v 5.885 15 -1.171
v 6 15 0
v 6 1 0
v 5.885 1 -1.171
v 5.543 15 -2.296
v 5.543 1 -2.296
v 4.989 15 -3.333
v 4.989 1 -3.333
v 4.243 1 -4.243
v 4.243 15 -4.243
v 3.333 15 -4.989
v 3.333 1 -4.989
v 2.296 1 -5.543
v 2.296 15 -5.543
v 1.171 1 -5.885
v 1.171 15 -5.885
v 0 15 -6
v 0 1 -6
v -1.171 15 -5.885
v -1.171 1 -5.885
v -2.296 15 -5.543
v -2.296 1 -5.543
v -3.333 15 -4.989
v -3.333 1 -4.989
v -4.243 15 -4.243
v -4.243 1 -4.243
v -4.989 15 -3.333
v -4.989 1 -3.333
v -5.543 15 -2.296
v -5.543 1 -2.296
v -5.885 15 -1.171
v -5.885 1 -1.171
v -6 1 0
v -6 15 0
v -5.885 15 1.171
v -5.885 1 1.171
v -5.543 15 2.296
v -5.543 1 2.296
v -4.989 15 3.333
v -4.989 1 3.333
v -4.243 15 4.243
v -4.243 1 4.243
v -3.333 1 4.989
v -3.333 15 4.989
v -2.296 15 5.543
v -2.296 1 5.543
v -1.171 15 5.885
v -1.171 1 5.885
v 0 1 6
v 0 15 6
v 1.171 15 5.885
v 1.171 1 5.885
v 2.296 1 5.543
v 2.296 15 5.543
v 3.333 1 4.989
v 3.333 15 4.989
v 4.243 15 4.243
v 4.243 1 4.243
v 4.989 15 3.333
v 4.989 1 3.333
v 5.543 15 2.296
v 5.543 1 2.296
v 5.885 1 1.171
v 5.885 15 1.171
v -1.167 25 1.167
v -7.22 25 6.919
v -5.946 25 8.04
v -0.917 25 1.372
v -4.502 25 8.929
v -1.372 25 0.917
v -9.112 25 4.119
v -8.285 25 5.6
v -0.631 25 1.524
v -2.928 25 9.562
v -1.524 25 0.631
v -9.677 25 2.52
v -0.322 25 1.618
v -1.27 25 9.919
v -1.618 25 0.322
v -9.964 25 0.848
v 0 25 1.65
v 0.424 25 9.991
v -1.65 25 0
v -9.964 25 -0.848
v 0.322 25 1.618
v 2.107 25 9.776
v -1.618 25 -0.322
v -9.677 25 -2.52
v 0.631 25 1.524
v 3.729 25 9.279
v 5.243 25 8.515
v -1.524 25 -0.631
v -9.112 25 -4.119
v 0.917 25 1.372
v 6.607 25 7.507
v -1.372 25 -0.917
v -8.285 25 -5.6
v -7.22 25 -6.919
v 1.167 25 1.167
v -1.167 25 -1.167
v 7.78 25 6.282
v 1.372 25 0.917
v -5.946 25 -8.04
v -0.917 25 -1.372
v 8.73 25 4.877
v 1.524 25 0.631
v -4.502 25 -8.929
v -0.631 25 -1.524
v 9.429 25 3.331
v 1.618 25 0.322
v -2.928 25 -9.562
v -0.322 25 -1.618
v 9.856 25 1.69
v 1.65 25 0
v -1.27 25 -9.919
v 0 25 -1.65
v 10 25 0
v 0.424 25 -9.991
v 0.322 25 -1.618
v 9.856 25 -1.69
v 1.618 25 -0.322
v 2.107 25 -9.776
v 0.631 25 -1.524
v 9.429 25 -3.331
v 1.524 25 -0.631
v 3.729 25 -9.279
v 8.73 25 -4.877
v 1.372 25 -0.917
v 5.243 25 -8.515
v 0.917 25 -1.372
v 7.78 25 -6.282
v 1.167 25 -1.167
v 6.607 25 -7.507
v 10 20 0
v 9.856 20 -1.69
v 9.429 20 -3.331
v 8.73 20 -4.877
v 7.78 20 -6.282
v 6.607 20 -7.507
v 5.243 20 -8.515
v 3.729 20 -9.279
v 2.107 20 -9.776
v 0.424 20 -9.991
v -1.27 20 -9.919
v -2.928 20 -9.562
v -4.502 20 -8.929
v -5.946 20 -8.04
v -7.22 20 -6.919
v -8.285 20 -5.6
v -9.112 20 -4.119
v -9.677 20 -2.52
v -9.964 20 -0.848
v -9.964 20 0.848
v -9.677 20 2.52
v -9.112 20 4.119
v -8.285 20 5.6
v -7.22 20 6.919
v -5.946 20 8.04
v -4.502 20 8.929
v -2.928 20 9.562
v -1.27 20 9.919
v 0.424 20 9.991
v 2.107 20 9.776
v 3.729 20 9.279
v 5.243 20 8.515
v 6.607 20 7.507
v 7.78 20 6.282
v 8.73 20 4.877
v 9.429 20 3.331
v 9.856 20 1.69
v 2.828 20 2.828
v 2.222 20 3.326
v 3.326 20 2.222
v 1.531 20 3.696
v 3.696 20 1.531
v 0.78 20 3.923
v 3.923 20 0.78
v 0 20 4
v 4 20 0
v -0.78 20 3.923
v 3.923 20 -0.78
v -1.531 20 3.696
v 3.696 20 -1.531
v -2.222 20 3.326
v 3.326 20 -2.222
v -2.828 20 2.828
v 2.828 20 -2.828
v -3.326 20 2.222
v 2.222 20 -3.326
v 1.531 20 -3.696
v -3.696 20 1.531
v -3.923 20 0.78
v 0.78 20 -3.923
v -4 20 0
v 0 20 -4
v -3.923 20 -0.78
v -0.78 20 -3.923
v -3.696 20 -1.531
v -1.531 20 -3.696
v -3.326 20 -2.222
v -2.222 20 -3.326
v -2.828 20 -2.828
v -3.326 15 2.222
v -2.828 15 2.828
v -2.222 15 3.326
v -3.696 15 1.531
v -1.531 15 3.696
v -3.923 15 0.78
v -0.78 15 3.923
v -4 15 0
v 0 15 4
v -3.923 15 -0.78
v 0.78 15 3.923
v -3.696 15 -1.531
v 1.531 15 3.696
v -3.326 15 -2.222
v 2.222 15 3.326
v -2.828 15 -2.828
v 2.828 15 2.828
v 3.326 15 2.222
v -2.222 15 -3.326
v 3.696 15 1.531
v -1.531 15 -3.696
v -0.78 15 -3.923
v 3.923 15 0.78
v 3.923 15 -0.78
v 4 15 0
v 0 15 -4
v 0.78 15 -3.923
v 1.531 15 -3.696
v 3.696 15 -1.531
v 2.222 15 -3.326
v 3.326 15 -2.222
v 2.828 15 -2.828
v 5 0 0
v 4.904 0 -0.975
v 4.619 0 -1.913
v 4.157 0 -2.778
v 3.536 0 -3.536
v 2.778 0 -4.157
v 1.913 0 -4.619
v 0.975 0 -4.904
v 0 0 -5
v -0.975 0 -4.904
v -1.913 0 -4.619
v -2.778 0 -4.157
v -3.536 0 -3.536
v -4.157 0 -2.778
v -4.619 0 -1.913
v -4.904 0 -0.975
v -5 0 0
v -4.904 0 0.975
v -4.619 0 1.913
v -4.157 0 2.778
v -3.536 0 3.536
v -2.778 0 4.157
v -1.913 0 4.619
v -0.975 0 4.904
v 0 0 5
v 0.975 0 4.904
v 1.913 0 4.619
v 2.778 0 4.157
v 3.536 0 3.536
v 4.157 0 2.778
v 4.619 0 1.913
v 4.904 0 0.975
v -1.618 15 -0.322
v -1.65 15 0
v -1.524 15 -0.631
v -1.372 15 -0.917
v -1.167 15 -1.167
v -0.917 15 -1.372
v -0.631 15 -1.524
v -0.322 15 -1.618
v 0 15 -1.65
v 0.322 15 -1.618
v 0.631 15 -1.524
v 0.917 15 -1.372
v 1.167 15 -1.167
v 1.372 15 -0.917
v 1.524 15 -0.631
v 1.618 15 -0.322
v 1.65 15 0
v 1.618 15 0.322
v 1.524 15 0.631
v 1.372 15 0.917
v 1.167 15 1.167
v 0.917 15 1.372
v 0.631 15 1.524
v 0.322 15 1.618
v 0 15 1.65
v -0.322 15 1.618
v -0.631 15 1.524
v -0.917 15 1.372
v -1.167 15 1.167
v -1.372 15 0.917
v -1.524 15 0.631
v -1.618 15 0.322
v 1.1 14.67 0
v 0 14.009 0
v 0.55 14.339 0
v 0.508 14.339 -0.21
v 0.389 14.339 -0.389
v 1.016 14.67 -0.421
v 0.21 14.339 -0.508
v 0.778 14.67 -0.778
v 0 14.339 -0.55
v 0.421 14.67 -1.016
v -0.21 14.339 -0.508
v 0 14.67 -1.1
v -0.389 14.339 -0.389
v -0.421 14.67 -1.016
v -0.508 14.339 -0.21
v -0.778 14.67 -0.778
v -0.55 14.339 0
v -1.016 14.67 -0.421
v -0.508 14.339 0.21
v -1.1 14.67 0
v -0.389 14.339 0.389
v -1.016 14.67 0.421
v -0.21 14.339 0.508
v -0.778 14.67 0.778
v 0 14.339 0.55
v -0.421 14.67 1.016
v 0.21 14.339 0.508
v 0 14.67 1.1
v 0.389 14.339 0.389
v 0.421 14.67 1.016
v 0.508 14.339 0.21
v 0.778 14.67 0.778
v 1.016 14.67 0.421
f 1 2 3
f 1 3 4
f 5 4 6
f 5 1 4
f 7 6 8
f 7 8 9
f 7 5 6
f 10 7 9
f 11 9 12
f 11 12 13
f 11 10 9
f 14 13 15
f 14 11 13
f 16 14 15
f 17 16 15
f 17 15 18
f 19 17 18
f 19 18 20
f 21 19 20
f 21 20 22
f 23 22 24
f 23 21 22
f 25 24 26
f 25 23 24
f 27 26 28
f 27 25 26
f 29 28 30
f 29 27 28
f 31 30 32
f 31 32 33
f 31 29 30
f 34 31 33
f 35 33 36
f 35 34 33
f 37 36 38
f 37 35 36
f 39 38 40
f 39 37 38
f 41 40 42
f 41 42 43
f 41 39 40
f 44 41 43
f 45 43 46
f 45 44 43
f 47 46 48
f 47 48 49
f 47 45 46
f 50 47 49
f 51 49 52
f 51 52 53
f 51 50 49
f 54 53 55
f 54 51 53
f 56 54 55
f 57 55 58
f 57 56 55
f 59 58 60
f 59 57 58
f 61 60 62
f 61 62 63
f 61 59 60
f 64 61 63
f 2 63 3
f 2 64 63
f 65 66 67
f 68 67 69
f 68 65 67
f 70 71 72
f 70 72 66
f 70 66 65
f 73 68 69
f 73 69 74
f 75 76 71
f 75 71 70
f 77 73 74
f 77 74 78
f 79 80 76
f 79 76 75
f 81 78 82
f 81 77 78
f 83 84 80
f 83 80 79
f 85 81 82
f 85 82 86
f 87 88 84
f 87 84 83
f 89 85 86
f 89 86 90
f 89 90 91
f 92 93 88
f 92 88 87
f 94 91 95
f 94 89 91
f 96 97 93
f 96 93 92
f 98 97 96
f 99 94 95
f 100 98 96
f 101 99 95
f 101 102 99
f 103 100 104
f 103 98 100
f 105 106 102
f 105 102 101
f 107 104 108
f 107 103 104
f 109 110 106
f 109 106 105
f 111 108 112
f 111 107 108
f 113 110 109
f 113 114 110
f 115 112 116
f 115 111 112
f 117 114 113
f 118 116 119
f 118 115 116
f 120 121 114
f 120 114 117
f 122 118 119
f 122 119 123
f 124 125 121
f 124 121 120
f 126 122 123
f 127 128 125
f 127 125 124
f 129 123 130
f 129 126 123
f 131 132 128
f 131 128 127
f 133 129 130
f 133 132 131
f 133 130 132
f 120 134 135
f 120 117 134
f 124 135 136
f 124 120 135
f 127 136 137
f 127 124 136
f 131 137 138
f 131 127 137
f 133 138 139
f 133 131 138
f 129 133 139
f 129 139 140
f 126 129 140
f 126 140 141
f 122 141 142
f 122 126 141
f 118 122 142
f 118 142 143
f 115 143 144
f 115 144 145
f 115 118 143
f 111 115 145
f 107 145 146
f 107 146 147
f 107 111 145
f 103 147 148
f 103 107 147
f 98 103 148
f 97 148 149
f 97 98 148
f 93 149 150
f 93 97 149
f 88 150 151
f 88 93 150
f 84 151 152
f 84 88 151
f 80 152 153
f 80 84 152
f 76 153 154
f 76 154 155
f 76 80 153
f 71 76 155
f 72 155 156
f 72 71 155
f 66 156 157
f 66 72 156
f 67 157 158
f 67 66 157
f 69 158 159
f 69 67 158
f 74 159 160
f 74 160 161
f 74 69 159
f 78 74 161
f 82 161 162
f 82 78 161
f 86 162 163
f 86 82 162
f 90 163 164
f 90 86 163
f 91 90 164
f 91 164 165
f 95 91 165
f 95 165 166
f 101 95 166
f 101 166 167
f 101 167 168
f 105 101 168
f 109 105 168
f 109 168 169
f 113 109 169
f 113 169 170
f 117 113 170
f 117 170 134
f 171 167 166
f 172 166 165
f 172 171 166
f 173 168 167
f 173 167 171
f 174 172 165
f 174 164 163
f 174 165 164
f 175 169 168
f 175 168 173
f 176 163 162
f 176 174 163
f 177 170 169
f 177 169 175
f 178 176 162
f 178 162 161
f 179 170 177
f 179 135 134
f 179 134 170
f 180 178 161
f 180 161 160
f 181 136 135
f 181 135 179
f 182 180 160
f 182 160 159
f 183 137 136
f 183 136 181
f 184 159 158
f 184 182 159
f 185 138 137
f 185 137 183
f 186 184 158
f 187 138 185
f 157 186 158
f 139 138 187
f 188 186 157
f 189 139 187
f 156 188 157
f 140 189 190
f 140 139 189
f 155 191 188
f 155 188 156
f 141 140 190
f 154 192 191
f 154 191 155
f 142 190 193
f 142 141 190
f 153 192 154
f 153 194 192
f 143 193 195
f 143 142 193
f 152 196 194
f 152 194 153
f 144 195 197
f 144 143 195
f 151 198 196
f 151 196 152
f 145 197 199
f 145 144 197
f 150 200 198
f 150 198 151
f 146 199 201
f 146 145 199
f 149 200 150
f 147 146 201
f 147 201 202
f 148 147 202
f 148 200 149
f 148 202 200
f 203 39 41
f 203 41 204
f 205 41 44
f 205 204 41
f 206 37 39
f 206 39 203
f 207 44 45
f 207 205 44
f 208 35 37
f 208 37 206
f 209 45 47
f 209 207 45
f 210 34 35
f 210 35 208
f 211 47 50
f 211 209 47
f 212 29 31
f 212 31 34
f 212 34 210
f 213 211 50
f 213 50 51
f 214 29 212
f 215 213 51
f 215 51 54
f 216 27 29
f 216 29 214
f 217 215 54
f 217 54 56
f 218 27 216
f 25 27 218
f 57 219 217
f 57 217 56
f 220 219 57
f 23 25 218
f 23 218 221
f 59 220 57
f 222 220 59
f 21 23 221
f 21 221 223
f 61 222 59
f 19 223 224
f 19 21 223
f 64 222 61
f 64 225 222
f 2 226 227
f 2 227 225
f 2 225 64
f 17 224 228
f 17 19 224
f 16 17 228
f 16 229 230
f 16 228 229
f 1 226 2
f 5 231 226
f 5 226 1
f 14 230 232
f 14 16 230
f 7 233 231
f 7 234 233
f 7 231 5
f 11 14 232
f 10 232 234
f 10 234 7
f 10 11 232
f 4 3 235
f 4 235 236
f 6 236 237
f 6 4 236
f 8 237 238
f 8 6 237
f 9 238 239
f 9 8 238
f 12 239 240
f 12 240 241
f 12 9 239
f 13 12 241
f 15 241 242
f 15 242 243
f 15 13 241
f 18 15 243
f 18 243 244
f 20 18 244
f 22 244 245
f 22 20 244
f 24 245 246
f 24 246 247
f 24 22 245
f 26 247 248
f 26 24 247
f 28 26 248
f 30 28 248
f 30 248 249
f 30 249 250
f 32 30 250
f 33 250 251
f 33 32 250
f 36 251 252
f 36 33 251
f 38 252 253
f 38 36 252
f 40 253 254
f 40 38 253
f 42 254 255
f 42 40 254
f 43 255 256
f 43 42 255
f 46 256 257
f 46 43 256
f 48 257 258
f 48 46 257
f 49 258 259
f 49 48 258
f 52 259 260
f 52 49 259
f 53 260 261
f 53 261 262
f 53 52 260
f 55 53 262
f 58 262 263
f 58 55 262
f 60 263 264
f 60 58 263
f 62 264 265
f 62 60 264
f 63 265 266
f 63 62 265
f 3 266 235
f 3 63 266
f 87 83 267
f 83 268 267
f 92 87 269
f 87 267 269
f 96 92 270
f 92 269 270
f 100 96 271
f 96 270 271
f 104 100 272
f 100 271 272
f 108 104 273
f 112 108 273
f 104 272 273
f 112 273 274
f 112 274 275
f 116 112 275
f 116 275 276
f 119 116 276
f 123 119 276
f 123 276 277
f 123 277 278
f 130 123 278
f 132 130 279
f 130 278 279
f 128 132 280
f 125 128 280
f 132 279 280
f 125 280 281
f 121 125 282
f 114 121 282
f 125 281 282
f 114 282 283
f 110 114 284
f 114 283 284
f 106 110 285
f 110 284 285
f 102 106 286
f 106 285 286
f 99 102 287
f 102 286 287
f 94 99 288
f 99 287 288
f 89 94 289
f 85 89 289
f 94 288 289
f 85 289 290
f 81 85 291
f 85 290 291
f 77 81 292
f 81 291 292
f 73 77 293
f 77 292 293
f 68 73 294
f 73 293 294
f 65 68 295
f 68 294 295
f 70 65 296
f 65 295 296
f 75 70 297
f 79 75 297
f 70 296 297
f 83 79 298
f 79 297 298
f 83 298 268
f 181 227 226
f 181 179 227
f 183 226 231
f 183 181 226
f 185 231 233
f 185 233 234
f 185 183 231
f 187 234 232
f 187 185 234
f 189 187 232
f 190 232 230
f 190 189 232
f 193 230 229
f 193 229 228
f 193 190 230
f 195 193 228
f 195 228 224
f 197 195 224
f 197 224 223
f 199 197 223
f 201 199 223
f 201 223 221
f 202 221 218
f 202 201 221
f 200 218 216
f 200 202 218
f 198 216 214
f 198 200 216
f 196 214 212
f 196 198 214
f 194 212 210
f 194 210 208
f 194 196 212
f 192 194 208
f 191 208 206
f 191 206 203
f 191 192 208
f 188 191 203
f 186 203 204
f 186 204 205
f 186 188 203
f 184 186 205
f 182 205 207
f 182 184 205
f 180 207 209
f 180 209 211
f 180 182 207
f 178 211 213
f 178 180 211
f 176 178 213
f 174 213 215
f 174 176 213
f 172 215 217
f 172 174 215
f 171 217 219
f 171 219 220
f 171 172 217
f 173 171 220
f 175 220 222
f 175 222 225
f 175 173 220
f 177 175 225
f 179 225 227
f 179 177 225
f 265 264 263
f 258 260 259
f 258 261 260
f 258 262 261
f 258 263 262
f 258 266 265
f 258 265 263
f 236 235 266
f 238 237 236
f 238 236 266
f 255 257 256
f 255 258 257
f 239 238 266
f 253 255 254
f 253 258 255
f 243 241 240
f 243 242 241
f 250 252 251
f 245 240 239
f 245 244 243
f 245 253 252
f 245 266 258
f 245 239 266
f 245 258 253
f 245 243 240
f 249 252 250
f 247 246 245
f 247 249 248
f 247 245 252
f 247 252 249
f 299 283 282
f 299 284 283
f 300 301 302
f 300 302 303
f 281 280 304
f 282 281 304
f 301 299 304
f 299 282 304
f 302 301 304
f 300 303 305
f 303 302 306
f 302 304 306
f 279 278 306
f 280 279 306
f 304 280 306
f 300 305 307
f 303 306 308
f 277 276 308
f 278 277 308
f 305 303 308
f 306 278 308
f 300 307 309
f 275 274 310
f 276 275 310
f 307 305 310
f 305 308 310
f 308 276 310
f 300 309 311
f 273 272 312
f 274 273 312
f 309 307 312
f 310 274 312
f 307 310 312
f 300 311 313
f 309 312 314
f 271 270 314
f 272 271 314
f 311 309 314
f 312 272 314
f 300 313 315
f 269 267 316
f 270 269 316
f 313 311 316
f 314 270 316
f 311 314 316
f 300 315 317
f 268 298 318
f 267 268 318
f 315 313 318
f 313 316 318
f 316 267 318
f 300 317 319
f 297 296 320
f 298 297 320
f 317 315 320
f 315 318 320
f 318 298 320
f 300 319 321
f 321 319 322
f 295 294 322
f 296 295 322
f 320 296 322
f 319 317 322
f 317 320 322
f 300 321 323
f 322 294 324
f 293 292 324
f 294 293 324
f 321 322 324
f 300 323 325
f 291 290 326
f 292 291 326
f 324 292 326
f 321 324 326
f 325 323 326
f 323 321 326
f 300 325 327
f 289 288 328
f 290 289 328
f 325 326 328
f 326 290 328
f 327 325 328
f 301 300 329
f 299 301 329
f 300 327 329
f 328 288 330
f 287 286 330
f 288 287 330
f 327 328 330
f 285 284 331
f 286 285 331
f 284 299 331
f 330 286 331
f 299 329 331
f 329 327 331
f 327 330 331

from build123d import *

# Parameters (mm, degrees)
CHAMFER_1_SIZE         = 1
HOLE_WIZARD_M4_1_D     = 3.3
HOLE_WIZARD_M4_1_DEPTH = 10
HOLE_WIZARD_M4_1_TIP   = 0.991420021


with BuildPart() as part:
    # 草图1 → 旋转1 (revolve)
    with BuildSketch(Plane.XY, mode=Mode.PRIVATE) as revolve_1_sk:
        Polygon((0, 0), (-6, 0), (-6, 15), (-4, 15), (-4, 20), (-10, 20), (-10, 25), (0, 25), align=None)
    revolve(revolve_1_sk.sketch.rotate(Axis((0, -198.13008407, 0), (0, 1, 0)), 180), axis=Axis((0, -198.13008407, 0), (0, 1, 0)))

    # 倒角1
    chamfer_1_edges = [part.edges().sort_by_distance(p)[0] for p in [
        (-6, 0, 0),
    ]]
    chamfer(chamfer_1_edges, length=CHAMFER_1_SIZE)

    # M4 螺纹孔1
    with Locations(Plane(origin=(0, 25, 0), x_dir=(1, 0, 0), z_dir=(0, 1, 0))):
        with Locations((0, 0)):
            Hole(HOLE_WIZARD_M4_1_D / 2, depth=HOLE_WIZARD_M4_1_DEPTH)
            with Locations((0, 0, -(HOLE_WIZARD_M4_1_DEPTH + HOLE_WIZARD_M4_1_TIP / 2))):  # 118° drill point
                Cone(0, HOLE_WIZARD_M4_1_D / 2, HOLE_WIZARD_M4_1_TIP, mode=Mode.SUBTRACT)


solid = part.part
